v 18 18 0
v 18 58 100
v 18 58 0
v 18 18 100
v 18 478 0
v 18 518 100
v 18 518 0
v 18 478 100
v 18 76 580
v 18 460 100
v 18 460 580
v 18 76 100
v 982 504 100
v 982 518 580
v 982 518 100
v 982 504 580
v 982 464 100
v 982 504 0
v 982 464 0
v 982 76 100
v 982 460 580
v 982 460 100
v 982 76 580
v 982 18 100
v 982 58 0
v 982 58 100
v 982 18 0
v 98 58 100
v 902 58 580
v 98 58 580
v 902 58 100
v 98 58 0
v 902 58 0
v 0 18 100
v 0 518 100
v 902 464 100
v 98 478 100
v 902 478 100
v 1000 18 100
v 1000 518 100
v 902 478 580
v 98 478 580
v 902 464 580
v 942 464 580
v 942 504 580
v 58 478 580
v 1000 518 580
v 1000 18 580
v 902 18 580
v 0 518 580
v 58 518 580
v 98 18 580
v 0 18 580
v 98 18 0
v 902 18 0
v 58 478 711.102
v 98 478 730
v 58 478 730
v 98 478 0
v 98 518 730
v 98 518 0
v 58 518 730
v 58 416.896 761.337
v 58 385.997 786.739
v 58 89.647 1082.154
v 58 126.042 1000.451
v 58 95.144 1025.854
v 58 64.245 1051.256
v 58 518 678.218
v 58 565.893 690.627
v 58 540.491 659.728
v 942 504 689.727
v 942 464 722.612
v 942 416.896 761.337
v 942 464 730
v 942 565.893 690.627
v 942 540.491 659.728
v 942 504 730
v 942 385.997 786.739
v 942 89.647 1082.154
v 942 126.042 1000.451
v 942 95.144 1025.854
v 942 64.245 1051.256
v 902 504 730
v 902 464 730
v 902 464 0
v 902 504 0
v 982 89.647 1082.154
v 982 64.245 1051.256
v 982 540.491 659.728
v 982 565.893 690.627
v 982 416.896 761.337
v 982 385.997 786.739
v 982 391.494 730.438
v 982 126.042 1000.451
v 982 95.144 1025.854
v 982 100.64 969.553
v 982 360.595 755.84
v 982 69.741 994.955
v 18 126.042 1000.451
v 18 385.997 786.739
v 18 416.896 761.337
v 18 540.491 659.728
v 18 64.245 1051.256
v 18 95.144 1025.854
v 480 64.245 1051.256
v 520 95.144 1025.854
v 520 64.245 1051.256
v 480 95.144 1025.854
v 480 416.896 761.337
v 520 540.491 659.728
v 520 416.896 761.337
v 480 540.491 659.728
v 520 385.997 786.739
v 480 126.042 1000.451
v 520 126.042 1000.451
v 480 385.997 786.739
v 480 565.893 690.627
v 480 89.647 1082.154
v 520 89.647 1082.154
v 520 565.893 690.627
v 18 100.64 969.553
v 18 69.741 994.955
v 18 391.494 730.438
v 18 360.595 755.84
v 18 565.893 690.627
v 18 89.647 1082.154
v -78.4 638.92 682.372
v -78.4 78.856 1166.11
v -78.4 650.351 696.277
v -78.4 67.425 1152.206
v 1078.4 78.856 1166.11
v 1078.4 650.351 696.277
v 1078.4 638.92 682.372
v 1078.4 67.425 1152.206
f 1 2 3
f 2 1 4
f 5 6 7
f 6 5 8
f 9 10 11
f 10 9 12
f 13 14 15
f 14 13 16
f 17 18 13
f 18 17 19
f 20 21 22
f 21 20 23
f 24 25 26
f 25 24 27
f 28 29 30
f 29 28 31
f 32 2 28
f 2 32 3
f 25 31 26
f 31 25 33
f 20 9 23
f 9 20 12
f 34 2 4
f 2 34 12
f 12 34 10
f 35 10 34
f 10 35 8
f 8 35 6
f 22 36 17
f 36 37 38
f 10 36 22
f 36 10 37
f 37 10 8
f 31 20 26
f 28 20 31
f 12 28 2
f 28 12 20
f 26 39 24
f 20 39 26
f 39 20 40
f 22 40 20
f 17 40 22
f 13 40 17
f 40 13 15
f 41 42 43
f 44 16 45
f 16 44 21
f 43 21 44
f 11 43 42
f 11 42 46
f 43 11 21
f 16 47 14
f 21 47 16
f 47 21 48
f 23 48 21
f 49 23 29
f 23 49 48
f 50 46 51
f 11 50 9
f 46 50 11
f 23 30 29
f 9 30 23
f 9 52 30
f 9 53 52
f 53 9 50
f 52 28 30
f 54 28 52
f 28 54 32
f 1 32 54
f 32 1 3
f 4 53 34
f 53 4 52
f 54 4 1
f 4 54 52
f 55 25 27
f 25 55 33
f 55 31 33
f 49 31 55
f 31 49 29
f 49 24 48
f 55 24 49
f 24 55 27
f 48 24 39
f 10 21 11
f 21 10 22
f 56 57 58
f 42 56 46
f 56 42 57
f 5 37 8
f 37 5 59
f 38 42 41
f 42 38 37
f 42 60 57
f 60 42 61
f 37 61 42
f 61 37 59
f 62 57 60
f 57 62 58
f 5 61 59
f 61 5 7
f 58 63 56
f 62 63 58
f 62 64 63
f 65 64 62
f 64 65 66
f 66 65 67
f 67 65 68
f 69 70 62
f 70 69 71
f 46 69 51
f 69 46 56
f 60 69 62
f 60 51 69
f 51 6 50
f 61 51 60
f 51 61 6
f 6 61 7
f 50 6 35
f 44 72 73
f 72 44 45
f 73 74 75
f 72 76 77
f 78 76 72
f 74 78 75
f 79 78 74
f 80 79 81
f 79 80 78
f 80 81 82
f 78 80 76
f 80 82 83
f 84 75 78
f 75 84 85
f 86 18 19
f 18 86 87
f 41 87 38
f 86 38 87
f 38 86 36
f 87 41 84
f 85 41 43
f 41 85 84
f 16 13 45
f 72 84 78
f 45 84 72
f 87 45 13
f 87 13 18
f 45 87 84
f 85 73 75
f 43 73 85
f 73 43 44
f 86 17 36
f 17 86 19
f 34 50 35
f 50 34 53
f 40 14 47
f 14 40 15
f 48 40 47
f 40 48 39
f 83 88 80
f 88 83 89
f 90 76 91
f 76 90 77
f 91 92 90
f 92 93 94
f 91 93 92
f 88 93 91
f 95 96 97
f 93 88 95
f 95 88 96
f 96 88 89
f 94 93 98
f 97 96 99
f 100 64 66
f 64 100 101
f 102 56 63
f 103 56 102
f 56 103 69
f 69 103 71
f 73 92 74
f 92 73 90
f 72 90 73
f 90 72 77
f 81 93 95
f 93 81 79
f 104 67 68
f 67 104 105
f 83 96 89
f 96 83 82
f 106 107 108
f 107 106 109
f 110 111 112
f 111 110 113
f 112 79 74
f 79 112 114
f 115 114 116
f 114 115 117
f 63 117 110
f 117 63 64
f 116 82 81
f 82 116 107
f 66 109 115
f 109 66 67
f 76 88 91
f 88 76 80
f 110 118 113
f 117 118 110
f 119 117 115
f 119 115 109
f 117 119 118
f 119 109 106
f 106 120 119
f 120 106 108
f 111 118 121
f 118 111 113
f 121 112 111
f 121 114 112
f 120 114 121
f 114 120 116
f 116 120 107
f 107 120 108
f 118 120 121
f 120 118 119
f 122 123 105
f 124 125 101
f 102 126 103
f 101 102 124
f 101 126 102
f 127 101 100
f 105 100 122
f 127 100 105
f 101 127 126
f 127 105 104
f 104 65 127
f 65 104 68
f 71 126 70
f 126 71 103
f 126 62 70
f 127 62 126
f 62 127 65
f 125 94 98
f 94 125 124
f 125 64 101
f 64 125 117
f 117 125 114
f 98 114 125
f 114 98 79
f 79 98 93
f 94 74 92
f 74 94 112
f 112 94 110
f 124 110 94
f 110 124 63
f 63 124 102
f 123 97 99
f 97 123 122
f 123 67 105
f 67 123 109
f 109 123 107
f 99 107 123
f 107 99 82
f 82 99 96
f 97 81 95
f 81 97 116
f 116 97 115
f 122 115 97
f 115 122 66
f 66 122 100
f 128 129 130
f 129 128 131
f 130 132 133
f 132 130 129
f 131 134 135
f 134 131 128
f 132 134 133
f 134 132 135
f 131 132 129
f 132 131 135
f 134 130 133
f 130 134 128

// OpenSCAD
use <modules_kiero.scad>

// カメラ位置の初期化（アニメーションする際はコメントアウト）
//$vpr = [45, 0, 45];
//$vpd = 4000;

// モデルを指定 (0:バクテリア、 1:ベランダ, 2:強化型バクテリア)
modelNumber = 2;

// キエーロのサイズを指定

// 本体の横幅
boxwidth = 1000;

// 本体の奥行き
boxdepth = 500;

// 本体の高さ
boxheight = 480;



// ***** その他のパラメータ *****

// 使用する板厚
thickness = 18;

// 足の（杭）の長さ
leg = 100;

// 角材の太さ
pillar=40;

// 背面の足の高さ
backheight = 150;


if(modelNumber==0){
    // 接地型キエーロを作る
    translate([0,0,-leg]) 
    draw_kieiro(boxwidth, boxdepth, boxheight, thickness, leg, pillar, backheight);
}
else if(modelNumber == 1){
    // 可搬型キエーロを作る
    draw_beranda(boxwidth, boxdepth, boxheight, thickness, leg, pillar, backheight);
}
else if(modelNumber == 2){
    // 設置型キエーロ強化タイプを作る
    draw_enhanced(boxwidth, boxdepth, boxheight, thickness, leg, pillar, backheight);
}
